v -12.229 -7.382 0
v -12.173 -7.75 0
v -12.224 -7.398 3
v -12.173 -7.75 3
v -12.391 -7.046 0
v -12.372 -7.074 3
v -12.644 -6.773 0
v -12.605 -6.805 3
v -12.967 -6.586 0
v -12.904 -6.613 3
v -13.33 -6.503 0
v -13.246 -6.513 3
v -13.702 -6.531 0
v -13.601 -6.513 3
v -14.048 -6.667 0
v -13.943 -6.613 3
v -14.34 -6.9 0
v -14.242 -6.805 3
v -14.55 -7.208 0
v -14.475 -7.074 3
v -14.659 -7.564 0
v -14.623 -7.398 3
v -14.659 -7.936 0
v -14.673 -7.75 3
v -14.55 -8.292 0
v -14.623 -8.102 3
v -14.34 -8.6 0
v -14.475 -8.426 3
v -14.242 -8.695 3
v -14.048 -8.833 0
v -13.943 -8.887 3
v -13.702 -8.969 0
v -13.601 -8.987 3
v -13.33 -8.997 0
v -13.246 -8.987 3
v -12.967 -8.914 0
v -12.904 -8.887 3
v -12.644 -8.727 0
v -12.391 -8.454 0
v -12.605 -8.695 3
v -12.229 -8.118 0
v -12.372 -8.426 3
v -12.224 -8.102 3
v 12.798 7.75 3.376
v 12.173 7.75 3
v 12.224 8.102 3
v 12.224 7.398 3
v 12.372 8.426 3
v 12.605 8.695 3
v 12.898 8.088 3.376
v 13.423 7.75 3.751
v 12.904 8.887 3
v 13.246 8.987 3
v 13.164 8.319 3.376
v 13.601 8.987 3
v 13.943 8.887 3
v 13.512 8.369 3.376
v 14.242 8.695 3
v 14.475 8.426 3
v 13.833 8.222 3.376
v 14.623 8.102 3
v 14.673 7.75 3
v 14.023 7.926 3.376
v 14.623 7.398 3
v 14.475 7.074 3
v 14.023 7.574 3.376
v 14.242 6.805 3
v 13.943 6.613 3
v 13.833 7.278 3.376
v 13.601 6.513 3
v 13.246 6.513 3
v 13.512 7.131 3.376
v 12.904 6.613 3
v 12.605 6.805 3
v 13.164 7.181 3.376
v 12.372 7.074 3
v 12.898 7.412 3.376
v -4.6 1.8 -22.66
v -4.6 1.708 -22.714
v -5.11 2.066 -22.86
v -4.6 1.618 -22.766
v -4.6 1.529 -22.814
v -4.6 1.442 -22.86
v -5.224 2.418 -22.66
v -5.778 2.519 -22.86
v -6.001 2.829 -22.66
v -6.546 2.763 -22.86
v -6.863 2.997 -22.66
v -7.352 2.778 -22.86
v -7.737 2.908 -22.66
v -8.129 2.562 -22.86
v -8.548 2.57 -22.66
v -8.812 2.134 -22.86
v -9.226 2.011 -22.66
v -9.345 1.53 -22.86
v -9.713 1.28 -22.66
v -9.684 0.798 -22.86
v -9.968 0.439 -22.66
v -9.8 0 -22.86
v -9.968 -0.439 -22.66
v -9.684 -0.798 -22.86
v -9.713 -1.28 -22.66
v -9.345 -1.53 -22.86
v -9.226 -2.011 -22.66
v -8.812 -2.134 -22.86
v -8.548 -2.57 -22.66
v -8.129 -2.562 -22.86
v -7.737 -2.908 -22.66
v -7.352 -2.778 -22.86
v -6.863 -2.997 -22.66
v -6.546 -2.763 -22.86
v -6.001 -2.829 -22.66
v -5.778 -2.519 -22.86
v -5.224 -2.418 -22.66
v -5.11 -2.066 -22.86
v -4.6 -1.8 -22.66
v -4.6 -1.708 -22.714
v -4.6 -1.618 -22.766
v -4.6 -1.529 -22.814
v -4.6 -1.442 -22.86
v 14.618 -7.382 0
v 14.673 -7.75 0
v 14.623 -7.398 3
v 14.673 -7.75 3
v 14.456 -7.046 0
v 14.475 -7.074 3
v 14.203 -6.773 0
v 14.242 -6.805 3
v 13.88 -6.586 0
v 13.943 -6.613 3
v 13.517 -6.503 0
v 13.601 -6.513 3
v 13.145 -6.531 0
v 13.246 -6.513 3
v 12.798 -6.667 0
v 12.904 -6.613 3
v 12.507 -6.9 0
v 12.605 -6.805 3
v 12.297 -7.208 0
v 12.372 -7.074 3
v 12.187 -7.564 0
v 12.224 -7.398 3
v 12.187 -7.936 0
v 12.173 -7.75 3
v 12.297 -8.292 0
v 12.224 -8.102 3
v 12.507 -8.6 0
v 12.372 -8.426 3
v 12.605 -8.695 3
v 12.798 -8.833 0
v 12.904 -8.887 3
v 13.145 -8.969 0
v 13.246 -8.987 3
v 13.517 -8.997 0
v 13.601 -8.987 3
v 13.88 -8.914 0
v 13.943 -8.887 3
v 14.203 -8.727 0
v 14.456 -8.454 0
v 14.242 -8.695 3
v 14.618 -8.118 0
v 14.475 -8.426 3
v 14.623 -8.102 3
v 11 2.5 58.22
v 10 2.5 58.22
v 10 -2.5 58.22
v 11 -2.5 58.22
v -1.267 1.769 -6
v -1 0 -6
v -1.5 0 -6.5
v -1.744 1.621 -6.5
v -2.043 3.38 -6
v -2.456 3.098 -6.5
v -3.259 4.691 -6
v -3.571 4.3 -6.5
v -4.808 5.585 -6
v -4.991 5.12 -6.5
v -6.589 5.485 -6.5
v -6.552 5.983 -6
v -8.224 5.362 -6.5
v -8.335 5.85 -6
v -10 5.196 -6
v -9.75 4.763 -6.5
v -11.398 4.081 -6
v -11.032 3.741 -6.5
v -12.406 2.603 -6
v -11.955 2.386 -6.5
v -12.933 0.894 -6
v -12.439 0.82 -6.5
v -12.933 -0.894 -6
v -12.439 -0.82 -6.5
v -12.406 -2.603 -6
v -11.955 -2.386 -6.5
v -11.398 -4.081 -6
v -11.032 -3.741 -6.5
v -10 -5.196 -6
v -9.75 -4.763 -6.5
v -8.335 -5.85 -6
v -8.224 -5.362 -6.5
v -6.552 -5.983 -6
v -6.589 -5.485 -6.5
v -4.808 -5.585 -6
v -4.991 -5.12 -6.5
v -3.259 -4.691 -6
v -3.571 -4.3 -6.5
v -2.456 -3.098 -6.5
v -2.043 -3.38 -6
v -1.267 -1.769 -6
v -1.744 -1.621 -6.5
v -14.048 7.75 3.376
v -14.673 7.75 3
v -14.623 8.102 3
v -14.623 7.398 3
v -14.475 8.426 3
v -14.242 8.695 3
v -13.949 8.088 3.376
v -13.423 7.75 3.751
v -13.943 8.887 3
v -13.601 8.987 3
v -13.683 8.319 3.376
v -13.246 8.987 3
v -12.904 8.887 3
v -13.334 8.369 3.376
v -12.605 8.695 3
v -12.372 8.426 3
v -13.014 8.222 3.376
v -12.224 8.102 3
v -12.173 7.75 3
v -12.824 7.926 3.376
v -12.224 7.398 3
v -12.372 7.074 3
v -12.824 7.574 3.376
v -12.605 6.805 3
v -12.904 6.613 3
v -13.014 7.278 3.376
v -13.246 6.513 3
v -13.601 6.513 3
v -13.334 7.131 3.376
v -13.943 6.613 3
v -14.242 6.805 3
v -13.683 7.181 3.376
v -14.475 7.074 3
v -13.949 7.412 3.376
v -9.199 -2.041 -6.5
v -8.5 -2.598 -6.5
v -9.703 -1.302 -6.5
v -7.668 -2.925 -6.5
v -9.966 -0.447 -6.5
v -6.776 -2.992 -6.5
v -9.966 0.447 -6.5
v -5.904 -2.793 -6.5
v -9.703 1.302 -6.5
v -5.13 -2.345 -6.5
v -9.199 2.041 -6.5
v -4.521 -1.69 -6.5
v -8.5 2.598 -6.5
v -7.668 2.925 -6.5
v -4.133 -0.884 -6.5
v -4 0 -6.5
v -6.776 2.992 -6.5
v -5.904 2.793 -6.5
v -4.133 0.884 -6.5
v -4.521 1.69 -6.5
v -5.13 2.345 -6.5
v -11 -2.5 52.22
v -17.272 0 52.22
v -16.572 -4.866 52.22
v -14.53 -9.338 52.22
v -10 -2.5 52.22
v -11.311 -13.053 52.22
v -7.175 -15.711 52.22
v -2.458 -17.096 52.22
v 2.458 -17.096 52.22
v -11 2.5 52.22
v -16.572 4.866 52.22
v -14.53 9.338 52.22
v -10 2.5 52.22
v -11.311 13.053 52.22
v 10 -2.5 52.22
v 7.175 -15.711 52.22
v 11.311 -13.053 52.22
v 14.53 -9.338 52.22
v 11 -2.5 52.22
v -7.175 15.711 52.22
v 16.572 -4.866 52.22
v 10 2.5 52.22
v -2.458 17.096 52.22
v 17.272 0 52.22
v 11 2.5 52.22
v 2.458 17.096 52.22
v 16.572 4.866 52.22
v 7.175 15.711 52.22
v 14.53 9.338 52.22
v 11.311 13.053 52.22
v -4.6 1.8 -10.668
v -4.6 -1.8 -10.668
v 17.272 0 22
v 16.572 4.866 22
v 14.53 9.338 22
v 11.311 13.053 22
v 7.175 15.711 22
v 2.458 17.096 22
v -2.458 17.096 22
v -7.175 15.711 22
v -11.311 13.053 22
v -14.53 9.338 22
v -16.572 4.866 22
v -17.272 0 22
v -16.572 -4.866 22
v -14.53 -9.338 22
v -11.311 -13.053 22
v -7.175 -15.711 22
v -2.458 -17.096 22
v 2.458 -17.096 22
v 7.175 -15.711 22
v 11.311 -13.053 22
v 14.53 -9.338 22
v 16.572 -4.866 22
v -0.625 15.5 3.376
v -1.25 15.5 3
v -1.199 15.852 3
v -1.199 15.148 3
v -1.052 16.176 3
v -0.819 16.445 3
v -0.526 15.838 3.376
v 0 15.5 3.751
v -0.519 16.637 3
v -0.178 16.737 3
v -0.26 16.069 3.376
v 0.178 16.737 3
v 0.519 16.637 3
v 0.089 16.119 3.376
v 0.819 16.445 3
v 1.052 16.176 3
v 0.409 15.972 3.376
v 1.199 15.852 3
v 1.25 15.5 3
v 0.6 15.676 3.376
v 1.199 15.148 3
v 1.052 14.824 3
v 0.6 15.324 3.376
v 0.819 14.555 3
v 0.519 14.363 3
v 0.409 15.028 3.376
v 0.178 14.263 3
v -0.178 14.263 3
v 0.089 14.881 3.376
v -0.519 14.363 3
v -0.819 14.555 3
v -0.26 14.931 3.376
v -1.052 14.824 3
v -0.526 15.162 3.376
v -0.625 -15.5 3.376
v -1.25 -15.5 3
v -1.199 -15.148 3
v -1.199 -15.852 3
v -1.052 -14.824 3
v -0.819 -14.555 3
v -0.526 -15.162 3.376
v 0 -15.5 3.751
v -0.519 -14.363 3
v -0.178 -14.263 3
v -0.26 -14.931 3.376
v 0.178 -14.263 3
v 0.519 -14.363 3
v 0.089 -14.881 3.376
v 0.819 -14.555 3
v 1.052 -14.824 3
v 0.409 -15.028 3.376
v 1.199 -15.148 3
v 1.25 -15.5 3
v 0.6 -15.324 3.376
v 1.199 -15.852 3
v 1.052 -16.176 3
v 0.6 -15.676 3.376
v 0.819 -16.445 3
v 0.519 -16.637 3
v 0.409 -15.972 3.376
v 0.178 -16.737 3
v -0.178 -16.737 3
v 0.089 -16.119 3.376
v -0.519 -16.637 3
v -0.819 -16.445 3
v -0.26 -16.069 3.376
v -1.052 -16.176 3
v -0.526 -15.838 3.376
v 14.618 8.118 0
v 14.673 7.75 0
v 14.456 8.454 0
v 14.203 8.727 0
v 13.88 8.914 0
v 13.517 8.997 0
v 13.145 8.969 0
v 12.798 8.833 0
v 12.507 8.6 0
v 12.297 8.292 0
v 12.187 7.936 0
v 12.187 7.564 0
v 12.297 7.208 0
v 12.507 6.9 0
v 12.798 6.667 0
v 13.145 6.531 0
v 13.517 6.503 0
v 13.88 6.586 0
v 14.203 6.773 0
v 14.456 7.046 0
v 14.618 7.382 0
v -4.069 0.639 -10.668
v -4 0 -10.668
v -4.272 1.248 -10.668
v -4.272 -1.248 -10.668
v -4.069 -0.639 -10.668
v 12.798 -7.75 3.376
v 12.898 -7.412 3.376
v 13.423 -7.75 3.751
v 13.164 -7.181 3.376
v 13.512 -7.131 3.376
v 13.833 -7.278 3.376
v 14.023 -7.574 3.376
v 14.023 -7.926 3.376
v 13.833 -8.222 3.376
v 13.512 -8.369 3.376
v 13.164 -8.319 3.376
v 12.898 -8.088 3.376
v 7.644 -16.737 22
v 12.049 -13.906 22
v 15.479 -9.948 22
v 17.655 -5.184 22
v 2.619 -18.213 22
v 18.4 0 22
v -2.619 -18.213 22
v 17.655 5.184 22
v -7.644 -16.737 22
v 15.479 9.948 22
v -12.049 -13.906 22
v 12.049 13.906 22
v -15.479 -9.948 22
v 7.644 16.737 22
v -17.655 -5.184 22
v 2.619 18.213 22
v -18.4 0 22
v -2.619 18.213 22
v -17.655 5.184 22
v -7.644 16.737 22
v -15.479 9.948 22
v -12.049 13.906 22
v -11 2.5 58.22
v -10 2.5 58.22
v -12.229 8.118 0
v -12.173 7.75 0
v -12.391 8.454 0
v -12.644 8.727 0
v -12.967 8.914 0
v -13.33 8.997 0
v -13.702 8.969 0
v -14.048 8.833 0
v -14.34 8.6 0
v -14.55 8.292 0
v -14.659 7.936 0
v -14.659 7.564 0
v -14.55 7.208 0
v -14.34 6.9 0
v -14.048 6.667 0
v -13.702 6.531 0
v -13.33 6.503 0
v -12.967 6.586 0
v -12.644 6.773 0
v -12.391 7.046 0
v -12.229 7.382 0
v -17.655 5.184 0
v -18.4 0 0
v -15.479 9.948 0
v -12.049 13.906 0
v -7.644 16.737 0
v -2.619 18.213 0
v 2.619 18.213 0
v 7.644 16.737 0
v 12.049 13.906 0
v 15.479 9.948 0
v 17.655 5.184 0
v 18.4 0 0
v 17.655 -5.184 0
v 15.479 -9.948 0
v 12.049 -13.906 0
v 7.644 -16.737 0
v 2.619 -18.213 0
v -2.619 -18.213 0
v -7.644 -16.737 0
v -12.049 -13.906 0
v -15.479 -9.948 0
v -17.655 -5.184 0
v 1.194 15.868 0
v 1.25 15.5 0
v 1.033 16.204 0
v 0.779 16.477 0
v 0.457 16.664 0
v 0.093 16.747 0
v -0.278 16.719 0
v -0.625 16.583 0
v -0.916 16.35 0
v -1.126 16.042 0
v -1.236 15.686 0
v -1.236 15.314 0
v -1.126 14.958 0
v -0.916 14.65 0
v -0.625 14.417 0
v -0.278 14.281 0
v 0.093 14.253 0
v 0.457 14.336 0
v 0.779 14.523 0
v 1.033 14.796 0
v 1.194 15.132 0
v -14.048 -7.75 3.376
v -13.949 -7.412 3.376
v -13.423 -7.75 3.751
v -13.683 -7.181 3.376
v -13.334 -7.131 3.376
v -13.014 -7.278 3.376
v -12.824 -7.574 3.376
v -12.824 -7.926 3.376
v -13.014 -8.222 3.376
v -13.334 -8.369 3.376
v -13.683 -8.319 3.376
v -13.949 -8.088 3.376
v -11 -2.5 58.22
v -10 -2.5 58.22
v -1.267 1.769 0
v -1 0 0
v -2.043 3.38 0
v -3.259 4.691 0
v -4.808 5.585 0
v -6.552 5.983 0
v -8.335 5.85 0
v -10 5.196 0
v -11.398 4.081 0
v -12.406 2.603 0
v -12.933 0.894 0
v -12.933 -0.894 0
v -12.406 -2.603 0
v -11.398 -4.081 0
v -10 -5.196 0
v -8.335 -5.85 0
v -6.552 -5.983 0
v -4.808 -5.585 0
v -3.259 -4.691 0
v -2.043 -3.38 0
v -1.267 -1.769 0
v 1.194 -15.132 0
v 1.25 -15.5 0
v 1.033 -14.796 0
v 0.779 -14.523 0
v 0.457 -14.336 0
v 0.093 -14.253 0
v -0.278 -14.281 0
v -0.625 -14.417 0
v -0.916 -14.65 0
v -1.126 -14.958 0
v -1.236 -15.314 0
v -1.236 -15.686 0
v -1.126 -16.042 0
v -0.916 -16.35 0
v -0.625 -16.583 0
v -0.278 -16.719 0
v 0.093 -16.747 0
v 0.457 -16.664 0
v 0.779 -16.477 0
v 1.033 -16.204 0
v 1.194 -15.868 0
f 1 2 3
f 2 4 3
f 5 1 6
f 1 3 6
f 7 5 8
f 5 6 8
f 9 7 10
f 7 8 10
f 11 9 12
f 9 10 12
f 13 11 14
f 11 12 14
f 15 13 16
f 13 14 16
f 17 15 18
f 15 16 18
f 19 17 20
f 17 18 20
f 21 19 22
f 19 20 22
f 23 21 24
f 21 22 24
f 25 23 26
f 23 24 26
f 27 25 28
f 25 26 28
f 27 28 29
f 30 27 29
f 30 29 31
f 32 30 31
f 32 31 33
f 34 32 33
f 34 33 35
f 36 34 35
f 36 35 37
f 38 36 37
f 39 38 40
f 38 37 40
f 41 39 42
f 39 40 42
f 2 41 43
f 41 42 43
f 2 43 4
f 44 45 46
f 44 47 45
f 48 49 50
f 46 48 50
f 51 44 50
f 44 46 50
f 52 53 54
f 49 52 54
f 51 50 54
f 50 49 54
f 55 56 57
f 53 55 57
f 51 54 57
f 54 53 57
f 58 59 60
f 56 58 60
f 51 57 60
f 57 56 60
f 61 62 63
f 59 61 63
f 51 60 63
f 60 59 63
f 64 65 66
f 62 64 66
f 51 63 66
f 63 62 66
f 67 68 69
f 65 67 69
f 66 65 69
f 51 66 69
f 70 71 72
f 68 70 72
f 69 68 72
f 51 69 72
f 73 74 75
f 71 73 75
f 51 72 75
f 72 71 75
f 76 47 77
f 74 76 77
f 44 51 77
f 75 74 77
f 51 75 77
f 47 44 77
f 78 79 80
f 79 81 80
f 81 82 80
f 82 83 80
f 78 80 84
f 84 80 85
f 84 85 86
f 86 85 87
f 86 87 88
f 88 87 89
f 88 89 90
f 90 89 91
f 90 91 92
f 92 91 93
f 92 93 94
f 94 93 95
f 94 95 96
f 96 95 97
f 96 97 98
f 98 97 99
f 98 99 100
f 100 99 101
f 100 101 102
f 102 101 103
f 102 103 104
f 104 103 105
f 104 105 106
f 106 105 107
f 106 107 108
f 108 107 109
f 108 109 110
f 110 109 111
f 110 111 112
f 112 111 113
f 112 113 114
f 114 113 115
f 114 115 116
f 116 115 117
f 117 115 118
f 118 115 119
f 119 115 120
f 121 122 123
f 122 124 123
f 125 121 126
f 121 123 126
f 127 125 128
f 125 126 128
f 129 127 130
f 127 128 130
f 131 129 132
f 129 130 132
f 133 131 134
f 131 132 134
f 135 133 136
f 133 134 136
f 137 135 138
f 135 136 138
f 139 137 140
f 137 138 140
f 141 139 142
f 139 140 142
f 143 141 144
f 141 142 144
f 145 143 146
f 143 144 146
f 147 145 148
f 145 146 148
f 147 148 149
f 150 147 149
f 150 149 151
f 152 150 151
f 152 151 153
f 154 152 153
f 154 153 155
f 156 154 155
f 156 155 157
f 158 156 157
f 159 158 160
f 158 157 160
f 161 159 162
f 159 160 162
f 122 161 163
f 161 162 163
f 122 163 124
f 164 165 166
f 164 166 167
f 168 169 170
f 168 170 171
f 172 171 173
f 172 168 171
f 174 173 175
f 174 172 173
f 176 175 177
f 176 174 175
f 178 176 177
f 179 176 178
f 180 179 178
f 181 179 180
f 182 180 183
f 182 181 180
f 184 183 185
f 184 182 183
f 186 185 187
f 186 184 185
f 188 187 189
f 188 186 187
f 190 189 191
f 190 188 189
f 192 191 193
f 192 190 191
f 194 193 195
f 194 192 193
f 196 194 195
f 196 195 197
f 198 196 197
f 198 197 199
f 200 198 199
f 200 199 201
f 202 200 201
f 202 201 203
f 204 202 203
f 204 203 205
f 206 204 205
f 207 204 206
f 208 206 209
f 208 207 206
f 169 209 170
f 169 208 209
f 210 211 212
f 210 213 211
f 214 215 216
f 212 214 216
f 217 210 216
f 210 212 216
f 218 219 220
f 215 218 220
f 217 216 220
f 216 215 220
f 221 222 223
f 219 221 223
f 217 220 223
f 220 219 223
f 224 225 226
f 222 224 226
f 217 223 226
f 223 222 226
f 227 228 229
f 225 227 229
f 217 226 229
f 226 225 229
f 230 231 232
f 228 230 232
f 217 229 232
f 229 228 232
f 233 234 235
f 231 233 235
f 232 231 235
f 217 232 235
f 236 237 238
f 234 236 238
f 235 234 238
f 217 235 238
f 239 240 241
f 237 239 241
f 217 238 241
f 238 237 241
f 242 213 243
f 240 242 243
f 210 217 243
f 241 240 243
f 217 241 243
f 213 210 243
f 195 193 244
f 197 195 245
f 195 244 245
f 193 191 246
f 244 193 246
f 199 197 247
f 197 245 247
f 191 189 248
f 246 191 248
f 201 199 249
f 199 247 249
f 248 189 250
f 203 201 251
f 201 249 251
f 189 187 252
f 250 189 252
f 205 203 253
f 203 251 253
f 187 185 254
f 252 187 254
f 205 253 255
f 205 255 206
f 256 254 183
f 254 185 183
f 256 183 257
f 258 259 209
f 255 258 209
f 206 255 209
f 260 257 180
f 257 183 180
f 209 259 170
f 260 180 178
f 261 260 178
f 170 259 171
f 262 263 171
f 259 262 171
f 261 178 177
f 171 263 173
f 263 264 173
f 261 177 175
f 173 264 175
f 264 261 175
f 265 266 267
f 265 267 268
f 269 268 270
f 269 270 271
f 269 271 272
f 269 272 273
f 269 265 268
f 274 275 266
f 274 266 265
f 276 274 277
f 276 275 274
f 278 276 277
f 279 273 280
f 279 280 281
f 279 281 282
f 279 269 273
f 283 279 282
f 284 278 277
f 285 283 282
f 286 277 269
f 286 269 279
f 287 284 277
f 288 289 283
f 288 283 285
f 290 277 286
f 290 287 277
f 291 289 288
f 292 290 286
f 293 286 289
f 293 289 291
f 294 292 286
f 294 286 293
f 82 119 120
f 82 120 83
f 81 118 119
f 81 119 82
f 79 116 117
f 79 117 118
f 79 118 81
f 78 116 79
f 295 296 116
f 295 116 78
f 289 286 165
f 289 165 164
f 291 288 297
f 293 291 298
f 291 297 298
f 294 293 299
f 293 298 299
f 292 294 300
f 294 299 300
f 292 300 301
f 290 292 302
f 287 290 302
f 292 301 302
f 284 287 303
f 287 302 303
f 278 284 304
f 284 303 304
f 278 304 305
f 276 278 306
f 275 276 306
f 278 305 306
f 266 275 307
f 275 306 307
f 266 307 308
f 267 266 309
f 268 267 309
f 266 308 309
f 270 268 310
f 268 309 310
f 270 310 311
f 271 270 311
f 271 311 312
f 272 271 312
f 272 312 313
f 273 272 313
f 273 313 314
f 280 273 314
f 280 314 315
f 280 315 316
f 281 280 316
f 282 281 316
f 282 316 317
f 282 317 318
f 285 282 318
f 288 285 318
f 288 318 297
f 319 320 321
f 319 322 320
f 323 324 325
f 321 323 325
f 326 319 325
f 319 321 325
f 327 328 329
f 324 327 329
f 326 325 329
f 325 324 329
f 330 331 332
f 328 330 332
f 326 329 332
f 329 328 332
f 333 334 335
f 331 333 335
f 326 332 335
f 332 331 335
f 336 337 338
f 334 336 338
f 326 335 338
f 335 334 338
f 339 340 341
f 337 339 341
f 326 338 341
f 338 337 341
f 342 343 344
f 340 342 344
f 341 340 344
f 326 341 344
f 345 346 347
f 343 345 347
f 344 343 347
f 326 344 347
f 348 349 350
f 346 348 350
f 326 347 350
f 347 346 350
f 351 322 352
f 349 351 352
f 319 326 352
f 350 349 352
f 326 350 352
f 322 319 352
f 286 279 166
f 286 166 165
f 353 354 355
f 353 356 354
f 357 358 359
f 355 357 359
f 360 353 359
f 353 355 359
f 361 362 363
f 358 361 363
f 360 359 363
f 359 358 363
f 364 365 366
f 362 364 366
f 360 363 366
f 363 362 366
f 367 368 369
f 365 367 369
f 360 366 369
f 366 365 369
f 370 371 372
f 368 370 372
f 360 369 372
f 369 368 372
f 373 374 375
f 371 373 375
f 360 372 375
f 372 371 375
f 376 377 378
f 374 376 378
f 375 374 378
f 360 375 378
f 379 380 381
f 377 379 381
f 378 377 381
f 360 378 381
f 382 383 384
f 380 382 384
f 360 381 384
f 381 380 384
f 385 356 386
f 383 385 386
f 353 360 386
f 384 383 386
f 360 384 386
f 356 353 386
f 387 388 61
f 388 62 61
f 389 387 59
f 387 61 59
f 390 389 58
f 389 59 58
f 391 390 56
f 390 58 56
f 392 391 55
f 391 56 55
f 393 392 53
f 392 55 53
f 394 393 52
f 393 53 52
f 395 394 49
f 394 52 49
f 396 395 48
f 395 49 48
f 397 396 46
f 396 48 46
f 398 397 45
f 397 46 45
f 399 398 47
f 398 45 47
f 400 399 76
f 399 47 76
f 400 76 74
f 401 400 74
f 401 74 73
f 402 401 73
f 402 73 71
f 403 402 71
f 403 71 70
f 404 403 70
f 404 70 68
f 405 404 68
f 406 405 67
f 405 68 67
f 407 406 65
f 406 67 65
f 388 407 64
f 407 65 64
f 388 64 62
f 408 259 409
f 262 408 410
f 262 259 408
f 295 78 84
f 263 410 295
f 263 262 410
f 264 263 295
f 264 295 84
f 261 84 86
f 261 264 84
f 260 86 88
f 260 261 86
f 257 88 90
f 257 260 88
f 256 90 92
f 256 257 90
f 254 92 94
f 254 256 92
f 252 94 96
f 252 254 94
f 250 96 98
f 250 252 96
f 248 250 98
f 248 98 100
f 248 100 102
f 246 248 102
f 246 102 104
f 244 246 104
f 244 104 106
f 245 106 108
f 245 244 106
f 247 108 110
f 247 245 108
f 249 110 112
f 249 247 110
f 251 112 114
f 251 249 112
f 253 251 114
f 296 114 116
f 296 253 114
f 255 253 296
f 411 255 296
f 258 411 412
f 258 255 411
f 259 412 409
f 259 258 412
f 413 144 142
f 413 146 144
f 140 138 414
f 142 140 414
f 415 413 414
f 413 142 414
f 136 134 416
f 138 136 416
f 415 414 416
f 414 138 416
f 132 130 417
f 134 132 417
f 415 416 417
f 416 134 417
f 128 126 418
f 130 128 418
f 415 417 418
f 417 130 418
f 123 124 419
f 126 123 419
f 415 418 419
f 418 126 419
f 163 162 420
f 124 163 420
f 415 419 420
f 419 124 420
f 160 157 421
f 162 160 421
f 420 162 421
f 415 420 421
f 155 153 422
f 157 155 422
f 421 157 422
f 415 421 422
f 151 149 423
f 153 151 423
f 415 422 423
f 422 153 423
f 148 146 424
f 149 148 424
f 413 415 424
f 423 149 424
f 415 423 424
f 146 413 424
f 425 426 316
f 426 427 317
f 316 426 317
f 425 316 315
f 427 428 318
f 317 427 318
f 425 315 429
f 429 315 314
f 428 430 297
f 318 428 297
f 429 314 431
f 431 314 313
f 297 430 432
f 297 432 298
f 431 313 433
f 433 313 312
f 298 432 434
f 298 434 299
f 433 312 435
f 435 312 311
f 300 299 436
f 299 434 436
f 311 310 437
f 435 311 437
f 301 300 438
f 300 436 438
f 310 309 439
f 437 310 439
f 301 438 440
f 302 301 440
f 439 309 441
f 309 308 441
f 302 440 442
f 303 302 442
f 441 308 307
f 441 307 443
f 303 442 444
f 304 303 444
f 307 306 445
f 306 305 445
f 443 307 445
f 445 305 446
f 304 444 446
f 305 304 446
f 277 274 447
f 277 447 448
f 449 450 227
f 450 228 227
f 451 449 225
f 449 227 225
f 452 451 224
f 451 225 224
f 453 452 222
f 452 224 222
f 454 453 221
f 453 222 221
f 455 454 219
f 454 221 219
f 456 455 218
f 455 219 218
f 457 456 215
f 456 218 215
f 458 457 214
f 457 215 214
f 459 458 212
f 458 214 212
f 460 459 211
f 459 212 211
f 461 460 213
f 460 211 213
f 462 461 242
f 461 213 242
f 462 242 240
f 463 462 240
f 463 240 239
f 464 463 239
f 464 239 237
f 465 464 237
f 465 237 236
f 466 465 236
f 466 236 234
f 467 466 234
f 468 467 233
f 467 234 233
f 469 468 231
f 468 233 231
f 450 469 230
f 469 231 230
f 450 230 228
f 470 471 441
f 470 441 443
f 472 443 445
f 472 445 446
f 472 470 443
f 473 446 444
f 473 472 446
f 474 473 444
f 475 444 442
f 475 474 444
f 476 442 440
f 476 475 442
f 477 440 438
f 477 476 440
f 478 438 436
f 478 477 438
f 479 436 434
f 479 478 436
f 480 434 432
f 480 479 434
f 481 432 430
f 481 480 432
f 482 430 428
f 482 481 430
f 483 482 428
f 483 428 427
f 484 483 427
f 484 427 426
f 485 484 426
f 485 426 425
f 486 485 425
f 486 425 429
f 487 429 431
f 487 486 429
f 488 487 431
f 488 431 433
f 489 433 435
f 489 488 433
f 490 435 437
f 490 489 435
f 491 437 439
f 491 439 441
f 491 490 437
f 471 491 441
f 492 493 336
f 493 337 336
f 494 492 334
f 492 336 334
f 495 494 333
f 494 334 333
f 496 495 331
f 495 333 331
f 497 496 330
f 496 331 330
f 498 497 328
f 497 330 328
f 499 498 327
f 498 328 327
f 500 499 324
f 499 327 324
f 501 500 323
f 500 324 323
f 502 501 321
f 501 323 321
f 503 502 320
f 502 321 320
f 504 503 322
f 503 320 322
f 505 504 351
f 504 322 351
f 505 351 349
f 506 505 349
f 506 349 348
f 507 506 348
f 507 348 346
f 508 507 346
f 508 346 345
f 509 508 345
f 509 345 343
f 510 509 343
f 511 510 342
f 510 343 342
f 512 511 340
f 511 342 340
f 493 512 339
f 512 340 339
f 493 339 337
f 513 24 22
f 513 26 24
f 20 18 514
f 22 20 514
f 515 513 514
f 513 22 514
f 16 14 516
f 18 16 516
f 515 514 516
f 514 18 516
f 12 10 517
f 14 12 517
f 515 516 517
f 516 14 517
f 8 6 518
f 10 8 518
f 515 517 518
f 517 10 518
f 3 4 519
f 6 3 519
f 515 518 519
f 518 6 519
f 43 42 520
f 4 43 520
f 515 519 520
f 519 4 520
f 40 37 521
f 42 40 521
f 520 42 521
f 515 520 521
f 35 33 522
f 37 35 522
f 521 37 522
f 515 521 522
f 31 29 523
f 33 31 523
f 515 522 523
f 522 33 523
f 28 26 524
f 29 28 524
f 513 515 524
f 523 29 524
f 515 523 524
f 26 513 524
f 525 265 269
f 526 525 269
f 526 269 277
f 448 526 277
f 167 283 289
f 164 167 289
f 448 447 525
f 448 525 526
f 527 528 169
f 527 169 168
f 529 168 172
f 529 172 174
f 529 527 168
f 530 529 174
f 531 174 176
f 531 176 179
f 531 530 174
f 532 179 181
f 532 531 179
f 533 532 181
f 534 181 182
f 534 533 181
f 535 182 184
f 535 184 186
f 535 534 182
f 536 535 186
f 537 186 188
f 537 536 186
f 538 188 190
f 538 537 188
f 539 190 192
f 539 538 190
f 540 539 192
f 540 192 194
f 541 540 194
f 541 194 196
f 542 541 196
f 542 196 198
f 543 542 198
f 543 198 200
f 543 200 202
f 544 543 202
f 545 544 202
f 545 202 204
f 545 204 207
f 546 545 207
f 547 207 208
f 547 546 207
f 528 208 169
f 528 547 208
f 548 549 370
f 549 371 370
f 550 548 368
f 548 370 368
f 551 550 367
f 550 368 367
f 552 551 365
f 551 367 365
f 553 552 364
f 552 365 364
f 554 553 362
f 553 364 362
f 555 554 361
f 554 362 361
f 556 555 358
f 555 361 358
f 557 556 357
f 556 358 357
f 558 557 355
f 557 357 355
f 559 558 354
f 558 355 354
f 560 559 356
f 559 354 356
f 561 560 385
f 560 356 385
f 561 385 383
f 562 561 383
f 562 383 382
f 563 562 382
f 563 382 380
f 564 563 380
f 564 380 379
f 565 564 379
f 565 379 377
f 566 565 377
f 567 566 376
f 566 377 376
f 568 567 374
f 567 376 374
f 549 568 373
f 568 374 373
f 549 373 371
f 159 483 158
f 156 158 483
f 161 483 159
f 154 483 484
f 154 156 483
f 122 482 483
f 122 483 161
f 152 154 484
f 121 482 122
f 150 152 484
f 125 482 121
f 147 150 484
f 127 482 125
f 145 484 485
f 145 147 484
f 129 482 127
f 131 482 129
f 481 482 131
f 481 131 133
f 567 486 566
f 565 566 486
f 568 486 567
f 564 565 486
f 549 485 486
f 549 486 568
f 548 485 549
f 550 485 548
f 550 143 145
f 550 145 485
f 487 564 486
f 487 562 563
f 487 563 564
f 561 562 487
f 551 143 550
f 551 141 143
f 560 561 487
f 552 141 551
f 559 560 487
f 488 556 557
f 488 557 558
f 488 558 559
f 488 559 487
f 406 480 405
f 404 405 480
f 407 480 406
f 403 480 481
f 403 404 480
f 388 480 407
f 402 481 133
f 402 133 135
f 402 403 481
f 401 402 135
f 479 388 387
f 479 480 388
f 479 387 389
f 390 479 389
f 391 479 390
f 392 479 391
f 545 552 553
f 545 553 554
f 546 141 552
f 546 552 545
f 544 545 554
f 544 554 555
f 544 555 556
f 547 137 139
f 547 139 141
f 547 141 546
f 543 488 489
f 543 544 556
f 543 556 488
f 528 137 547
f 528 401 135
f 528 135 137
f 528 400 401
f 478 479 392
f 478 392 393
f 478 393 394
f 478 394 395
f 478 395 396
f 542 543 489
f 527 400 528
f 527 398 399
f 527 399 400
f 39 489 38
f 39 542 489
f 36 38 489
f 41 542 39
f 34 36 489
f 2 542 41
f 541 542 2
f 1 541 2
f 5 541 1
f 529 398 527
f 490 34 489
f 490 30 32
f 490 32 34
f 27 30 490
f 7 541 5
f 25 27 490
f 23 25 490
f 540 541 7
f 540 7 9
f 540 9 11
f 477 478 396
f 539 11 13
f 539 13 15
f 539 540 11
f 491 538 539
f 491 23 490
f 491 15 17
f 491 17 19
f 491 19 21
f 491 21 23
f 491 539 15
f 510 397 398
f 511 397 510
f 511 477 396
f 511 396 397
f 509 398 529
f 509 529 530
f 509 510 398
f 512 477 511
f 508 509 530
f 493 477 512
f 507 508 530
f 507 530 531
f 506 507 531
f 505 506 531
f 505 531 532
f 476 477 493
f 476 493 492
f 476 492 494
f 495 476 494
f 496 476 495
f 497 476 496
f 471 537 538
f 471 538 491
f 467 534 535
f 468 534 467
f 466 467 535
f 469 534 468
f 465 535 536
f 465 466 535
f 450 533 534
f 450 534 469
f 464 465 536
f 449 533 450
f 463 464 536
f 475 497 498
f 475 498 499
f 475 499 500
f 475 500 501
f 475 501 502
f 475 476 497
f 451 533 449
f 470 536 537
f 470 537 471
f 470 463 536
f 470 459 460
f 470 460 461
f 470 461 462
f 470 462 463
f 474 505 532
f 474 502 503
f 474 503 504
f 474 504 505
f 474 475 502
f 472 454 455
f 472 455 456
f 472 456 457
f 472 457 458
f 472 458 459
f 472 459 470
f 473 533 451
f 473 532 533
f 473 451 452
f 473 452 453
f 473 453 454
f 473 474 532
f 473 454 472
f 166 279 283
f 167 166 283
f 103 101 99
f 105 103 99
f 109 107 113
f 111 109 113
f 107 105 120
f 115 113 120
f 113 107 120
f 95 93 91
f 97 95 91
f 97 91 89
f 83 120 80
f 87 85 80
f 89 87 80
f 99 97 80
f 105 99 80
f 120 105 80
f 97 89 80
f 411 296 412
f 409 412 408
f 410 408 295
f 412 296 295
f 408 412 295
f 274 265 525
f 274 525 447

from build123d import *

# Parameters (mm, degrees)
SKETCH1_R                   = 17.272
BOSS_EXTRUDE1_DEPTH         = 52.22
SKETCH1_3_R                 = 6
BOSS_EXTRUDE2_DEPTH         = 6.5
BOSS_EXTRUDE3_DEPTH         = 22.86
BOSS_EXTRUDE4_DEPTH         = 10.668
SKETCH2_W                   = 1
SKETCH2_H                   = 5
BOSS_EXTRUDE5_DEPTH         = 6
SKETCH4_R                   = 18.4
BOSS_EXTRUDE6_DEPTH         = 22
TAP_DRILL_FOR_M3_TAP1_D     = 2.5
TAP_DRILL_FOR_M3_TAP1_DEPTH = 3
TAP_DRILL_FOR_M3_TAP1_TIP   = 0.751075774
CHAMFER1_SIZE               = 0.2
CHAMFER2_SIZE               = 0.5


with BuildPart() as part:
    # Sketch1 → Boss-Extrude1 (new body)
    with BuildSketch(Plane.XY):
        Circle(SKETCH1_R)
    extrude(amount=BOSS_EXTRUDE1_DEPTH)

    # Sketch1<3> → Boss-Extrude2 (add)
    with BuildSketch(Plane.XY):
        with Locations((-7, 0)):
            Circle(SKETCH1_3_R)
    extrude(amount=-BOSS_EXTRUDE2_DEPTH)

    # Sketch1<4> → Boss-Extrude3 (add)
    with BuildSketch(Plane.XY):
        with BuildLine():
            Line((-4.6, -1.8), (-4.6, 1.8))
            ThreePointArc((-4.6, 1.8), (-10, 0), (-4.6, -1.8))
        make_face()
    extrude(amount=-BOSS_EXTRUDE3_DEPTH)

    # Sketch1<5> → Boss-Extrude4 (add)
    with BuildSketch(Plane.XY):
        with BuildLine():
            ThreePointArc((-4.6, -1.8), (-4, 0), (-4.6, 1.8))
            Line((-4.6, 1.8), (-4.6, -1.8))
        make_face()
    extrude(amount=-BOSS_EXTRUDE4_DEPTH)

    # Sketch2 → Boss-Extrude5 (add)
    with BuildSketch(Plane.XY.offset(52.22)):
        with Locations((-10.5, 0)):
            Rectangle(SKETCH2_W, SKETCH2_H)
        with Locations((10.5, 0)):
            Rectangle(SKETCH2_W, SKETCH2_H)
    extrude(amount=BOSS_EXTRUDE5_DEPTH)

    # Sketch4 → Boss-Extrude6 (add)
    with BuildSketch(Plane(origin=(0, 0, 0), x_dir=(-1, 0, 0), z_dir=(0, 0, -1))):
        Circle(SKETCH4_R)
    extrude(amount=-BOSS_EXTRUDE6_DEPTH)

    # Tap Drill for M3 Tap1
    with Locations(Plane(origin=(0, 0, 0), x_dir=(-1, 0, 0), z_dir=(0, 0, -1))):
        with Locations((-13.423393759, -7.75), (0, -15.5), (0, 15.5), (13.423393759, 7.75), (13.423393759, -7.75), (-13.423393759, 7.75)):
            Hole(TAP_DRILL_FOR_M3_TAP1_D / 2, depth=TAP_DRILL_FOR_M3_TAP1_DEPTH)
            with Locations((0, 0, -(TAP_DRILL_FOR_M3_TAP1_DEPTH + TAP_DRILL_FOR_M3_TAP1_TIP / 2))):  # 118° drill point
                Cone(0, TAP_DRILL_FOR_M3_TAP1_D / 2, TAP_DRILL_FOR_M3_TAP1_TIP, mode=Mode.SUBTRACT)

    # Chamfer1
    chamfer1_edges = [part.edges().sort_by_distance(p)[0] for p in [
        (-10, 0, -22.86),
    ]]
    chamfer(chamfer1_edges, length=CHAMFER1_SIZE)

    # Chamfer2
    chamfer2_edges = [part.edges().sort_by_distance(p)[0] for p in [
        (-13, 0, -6.5),
    ]]
    chamfer(chamfer2_edges, length=CHAMFER2_SIZE)


solid = part.part
